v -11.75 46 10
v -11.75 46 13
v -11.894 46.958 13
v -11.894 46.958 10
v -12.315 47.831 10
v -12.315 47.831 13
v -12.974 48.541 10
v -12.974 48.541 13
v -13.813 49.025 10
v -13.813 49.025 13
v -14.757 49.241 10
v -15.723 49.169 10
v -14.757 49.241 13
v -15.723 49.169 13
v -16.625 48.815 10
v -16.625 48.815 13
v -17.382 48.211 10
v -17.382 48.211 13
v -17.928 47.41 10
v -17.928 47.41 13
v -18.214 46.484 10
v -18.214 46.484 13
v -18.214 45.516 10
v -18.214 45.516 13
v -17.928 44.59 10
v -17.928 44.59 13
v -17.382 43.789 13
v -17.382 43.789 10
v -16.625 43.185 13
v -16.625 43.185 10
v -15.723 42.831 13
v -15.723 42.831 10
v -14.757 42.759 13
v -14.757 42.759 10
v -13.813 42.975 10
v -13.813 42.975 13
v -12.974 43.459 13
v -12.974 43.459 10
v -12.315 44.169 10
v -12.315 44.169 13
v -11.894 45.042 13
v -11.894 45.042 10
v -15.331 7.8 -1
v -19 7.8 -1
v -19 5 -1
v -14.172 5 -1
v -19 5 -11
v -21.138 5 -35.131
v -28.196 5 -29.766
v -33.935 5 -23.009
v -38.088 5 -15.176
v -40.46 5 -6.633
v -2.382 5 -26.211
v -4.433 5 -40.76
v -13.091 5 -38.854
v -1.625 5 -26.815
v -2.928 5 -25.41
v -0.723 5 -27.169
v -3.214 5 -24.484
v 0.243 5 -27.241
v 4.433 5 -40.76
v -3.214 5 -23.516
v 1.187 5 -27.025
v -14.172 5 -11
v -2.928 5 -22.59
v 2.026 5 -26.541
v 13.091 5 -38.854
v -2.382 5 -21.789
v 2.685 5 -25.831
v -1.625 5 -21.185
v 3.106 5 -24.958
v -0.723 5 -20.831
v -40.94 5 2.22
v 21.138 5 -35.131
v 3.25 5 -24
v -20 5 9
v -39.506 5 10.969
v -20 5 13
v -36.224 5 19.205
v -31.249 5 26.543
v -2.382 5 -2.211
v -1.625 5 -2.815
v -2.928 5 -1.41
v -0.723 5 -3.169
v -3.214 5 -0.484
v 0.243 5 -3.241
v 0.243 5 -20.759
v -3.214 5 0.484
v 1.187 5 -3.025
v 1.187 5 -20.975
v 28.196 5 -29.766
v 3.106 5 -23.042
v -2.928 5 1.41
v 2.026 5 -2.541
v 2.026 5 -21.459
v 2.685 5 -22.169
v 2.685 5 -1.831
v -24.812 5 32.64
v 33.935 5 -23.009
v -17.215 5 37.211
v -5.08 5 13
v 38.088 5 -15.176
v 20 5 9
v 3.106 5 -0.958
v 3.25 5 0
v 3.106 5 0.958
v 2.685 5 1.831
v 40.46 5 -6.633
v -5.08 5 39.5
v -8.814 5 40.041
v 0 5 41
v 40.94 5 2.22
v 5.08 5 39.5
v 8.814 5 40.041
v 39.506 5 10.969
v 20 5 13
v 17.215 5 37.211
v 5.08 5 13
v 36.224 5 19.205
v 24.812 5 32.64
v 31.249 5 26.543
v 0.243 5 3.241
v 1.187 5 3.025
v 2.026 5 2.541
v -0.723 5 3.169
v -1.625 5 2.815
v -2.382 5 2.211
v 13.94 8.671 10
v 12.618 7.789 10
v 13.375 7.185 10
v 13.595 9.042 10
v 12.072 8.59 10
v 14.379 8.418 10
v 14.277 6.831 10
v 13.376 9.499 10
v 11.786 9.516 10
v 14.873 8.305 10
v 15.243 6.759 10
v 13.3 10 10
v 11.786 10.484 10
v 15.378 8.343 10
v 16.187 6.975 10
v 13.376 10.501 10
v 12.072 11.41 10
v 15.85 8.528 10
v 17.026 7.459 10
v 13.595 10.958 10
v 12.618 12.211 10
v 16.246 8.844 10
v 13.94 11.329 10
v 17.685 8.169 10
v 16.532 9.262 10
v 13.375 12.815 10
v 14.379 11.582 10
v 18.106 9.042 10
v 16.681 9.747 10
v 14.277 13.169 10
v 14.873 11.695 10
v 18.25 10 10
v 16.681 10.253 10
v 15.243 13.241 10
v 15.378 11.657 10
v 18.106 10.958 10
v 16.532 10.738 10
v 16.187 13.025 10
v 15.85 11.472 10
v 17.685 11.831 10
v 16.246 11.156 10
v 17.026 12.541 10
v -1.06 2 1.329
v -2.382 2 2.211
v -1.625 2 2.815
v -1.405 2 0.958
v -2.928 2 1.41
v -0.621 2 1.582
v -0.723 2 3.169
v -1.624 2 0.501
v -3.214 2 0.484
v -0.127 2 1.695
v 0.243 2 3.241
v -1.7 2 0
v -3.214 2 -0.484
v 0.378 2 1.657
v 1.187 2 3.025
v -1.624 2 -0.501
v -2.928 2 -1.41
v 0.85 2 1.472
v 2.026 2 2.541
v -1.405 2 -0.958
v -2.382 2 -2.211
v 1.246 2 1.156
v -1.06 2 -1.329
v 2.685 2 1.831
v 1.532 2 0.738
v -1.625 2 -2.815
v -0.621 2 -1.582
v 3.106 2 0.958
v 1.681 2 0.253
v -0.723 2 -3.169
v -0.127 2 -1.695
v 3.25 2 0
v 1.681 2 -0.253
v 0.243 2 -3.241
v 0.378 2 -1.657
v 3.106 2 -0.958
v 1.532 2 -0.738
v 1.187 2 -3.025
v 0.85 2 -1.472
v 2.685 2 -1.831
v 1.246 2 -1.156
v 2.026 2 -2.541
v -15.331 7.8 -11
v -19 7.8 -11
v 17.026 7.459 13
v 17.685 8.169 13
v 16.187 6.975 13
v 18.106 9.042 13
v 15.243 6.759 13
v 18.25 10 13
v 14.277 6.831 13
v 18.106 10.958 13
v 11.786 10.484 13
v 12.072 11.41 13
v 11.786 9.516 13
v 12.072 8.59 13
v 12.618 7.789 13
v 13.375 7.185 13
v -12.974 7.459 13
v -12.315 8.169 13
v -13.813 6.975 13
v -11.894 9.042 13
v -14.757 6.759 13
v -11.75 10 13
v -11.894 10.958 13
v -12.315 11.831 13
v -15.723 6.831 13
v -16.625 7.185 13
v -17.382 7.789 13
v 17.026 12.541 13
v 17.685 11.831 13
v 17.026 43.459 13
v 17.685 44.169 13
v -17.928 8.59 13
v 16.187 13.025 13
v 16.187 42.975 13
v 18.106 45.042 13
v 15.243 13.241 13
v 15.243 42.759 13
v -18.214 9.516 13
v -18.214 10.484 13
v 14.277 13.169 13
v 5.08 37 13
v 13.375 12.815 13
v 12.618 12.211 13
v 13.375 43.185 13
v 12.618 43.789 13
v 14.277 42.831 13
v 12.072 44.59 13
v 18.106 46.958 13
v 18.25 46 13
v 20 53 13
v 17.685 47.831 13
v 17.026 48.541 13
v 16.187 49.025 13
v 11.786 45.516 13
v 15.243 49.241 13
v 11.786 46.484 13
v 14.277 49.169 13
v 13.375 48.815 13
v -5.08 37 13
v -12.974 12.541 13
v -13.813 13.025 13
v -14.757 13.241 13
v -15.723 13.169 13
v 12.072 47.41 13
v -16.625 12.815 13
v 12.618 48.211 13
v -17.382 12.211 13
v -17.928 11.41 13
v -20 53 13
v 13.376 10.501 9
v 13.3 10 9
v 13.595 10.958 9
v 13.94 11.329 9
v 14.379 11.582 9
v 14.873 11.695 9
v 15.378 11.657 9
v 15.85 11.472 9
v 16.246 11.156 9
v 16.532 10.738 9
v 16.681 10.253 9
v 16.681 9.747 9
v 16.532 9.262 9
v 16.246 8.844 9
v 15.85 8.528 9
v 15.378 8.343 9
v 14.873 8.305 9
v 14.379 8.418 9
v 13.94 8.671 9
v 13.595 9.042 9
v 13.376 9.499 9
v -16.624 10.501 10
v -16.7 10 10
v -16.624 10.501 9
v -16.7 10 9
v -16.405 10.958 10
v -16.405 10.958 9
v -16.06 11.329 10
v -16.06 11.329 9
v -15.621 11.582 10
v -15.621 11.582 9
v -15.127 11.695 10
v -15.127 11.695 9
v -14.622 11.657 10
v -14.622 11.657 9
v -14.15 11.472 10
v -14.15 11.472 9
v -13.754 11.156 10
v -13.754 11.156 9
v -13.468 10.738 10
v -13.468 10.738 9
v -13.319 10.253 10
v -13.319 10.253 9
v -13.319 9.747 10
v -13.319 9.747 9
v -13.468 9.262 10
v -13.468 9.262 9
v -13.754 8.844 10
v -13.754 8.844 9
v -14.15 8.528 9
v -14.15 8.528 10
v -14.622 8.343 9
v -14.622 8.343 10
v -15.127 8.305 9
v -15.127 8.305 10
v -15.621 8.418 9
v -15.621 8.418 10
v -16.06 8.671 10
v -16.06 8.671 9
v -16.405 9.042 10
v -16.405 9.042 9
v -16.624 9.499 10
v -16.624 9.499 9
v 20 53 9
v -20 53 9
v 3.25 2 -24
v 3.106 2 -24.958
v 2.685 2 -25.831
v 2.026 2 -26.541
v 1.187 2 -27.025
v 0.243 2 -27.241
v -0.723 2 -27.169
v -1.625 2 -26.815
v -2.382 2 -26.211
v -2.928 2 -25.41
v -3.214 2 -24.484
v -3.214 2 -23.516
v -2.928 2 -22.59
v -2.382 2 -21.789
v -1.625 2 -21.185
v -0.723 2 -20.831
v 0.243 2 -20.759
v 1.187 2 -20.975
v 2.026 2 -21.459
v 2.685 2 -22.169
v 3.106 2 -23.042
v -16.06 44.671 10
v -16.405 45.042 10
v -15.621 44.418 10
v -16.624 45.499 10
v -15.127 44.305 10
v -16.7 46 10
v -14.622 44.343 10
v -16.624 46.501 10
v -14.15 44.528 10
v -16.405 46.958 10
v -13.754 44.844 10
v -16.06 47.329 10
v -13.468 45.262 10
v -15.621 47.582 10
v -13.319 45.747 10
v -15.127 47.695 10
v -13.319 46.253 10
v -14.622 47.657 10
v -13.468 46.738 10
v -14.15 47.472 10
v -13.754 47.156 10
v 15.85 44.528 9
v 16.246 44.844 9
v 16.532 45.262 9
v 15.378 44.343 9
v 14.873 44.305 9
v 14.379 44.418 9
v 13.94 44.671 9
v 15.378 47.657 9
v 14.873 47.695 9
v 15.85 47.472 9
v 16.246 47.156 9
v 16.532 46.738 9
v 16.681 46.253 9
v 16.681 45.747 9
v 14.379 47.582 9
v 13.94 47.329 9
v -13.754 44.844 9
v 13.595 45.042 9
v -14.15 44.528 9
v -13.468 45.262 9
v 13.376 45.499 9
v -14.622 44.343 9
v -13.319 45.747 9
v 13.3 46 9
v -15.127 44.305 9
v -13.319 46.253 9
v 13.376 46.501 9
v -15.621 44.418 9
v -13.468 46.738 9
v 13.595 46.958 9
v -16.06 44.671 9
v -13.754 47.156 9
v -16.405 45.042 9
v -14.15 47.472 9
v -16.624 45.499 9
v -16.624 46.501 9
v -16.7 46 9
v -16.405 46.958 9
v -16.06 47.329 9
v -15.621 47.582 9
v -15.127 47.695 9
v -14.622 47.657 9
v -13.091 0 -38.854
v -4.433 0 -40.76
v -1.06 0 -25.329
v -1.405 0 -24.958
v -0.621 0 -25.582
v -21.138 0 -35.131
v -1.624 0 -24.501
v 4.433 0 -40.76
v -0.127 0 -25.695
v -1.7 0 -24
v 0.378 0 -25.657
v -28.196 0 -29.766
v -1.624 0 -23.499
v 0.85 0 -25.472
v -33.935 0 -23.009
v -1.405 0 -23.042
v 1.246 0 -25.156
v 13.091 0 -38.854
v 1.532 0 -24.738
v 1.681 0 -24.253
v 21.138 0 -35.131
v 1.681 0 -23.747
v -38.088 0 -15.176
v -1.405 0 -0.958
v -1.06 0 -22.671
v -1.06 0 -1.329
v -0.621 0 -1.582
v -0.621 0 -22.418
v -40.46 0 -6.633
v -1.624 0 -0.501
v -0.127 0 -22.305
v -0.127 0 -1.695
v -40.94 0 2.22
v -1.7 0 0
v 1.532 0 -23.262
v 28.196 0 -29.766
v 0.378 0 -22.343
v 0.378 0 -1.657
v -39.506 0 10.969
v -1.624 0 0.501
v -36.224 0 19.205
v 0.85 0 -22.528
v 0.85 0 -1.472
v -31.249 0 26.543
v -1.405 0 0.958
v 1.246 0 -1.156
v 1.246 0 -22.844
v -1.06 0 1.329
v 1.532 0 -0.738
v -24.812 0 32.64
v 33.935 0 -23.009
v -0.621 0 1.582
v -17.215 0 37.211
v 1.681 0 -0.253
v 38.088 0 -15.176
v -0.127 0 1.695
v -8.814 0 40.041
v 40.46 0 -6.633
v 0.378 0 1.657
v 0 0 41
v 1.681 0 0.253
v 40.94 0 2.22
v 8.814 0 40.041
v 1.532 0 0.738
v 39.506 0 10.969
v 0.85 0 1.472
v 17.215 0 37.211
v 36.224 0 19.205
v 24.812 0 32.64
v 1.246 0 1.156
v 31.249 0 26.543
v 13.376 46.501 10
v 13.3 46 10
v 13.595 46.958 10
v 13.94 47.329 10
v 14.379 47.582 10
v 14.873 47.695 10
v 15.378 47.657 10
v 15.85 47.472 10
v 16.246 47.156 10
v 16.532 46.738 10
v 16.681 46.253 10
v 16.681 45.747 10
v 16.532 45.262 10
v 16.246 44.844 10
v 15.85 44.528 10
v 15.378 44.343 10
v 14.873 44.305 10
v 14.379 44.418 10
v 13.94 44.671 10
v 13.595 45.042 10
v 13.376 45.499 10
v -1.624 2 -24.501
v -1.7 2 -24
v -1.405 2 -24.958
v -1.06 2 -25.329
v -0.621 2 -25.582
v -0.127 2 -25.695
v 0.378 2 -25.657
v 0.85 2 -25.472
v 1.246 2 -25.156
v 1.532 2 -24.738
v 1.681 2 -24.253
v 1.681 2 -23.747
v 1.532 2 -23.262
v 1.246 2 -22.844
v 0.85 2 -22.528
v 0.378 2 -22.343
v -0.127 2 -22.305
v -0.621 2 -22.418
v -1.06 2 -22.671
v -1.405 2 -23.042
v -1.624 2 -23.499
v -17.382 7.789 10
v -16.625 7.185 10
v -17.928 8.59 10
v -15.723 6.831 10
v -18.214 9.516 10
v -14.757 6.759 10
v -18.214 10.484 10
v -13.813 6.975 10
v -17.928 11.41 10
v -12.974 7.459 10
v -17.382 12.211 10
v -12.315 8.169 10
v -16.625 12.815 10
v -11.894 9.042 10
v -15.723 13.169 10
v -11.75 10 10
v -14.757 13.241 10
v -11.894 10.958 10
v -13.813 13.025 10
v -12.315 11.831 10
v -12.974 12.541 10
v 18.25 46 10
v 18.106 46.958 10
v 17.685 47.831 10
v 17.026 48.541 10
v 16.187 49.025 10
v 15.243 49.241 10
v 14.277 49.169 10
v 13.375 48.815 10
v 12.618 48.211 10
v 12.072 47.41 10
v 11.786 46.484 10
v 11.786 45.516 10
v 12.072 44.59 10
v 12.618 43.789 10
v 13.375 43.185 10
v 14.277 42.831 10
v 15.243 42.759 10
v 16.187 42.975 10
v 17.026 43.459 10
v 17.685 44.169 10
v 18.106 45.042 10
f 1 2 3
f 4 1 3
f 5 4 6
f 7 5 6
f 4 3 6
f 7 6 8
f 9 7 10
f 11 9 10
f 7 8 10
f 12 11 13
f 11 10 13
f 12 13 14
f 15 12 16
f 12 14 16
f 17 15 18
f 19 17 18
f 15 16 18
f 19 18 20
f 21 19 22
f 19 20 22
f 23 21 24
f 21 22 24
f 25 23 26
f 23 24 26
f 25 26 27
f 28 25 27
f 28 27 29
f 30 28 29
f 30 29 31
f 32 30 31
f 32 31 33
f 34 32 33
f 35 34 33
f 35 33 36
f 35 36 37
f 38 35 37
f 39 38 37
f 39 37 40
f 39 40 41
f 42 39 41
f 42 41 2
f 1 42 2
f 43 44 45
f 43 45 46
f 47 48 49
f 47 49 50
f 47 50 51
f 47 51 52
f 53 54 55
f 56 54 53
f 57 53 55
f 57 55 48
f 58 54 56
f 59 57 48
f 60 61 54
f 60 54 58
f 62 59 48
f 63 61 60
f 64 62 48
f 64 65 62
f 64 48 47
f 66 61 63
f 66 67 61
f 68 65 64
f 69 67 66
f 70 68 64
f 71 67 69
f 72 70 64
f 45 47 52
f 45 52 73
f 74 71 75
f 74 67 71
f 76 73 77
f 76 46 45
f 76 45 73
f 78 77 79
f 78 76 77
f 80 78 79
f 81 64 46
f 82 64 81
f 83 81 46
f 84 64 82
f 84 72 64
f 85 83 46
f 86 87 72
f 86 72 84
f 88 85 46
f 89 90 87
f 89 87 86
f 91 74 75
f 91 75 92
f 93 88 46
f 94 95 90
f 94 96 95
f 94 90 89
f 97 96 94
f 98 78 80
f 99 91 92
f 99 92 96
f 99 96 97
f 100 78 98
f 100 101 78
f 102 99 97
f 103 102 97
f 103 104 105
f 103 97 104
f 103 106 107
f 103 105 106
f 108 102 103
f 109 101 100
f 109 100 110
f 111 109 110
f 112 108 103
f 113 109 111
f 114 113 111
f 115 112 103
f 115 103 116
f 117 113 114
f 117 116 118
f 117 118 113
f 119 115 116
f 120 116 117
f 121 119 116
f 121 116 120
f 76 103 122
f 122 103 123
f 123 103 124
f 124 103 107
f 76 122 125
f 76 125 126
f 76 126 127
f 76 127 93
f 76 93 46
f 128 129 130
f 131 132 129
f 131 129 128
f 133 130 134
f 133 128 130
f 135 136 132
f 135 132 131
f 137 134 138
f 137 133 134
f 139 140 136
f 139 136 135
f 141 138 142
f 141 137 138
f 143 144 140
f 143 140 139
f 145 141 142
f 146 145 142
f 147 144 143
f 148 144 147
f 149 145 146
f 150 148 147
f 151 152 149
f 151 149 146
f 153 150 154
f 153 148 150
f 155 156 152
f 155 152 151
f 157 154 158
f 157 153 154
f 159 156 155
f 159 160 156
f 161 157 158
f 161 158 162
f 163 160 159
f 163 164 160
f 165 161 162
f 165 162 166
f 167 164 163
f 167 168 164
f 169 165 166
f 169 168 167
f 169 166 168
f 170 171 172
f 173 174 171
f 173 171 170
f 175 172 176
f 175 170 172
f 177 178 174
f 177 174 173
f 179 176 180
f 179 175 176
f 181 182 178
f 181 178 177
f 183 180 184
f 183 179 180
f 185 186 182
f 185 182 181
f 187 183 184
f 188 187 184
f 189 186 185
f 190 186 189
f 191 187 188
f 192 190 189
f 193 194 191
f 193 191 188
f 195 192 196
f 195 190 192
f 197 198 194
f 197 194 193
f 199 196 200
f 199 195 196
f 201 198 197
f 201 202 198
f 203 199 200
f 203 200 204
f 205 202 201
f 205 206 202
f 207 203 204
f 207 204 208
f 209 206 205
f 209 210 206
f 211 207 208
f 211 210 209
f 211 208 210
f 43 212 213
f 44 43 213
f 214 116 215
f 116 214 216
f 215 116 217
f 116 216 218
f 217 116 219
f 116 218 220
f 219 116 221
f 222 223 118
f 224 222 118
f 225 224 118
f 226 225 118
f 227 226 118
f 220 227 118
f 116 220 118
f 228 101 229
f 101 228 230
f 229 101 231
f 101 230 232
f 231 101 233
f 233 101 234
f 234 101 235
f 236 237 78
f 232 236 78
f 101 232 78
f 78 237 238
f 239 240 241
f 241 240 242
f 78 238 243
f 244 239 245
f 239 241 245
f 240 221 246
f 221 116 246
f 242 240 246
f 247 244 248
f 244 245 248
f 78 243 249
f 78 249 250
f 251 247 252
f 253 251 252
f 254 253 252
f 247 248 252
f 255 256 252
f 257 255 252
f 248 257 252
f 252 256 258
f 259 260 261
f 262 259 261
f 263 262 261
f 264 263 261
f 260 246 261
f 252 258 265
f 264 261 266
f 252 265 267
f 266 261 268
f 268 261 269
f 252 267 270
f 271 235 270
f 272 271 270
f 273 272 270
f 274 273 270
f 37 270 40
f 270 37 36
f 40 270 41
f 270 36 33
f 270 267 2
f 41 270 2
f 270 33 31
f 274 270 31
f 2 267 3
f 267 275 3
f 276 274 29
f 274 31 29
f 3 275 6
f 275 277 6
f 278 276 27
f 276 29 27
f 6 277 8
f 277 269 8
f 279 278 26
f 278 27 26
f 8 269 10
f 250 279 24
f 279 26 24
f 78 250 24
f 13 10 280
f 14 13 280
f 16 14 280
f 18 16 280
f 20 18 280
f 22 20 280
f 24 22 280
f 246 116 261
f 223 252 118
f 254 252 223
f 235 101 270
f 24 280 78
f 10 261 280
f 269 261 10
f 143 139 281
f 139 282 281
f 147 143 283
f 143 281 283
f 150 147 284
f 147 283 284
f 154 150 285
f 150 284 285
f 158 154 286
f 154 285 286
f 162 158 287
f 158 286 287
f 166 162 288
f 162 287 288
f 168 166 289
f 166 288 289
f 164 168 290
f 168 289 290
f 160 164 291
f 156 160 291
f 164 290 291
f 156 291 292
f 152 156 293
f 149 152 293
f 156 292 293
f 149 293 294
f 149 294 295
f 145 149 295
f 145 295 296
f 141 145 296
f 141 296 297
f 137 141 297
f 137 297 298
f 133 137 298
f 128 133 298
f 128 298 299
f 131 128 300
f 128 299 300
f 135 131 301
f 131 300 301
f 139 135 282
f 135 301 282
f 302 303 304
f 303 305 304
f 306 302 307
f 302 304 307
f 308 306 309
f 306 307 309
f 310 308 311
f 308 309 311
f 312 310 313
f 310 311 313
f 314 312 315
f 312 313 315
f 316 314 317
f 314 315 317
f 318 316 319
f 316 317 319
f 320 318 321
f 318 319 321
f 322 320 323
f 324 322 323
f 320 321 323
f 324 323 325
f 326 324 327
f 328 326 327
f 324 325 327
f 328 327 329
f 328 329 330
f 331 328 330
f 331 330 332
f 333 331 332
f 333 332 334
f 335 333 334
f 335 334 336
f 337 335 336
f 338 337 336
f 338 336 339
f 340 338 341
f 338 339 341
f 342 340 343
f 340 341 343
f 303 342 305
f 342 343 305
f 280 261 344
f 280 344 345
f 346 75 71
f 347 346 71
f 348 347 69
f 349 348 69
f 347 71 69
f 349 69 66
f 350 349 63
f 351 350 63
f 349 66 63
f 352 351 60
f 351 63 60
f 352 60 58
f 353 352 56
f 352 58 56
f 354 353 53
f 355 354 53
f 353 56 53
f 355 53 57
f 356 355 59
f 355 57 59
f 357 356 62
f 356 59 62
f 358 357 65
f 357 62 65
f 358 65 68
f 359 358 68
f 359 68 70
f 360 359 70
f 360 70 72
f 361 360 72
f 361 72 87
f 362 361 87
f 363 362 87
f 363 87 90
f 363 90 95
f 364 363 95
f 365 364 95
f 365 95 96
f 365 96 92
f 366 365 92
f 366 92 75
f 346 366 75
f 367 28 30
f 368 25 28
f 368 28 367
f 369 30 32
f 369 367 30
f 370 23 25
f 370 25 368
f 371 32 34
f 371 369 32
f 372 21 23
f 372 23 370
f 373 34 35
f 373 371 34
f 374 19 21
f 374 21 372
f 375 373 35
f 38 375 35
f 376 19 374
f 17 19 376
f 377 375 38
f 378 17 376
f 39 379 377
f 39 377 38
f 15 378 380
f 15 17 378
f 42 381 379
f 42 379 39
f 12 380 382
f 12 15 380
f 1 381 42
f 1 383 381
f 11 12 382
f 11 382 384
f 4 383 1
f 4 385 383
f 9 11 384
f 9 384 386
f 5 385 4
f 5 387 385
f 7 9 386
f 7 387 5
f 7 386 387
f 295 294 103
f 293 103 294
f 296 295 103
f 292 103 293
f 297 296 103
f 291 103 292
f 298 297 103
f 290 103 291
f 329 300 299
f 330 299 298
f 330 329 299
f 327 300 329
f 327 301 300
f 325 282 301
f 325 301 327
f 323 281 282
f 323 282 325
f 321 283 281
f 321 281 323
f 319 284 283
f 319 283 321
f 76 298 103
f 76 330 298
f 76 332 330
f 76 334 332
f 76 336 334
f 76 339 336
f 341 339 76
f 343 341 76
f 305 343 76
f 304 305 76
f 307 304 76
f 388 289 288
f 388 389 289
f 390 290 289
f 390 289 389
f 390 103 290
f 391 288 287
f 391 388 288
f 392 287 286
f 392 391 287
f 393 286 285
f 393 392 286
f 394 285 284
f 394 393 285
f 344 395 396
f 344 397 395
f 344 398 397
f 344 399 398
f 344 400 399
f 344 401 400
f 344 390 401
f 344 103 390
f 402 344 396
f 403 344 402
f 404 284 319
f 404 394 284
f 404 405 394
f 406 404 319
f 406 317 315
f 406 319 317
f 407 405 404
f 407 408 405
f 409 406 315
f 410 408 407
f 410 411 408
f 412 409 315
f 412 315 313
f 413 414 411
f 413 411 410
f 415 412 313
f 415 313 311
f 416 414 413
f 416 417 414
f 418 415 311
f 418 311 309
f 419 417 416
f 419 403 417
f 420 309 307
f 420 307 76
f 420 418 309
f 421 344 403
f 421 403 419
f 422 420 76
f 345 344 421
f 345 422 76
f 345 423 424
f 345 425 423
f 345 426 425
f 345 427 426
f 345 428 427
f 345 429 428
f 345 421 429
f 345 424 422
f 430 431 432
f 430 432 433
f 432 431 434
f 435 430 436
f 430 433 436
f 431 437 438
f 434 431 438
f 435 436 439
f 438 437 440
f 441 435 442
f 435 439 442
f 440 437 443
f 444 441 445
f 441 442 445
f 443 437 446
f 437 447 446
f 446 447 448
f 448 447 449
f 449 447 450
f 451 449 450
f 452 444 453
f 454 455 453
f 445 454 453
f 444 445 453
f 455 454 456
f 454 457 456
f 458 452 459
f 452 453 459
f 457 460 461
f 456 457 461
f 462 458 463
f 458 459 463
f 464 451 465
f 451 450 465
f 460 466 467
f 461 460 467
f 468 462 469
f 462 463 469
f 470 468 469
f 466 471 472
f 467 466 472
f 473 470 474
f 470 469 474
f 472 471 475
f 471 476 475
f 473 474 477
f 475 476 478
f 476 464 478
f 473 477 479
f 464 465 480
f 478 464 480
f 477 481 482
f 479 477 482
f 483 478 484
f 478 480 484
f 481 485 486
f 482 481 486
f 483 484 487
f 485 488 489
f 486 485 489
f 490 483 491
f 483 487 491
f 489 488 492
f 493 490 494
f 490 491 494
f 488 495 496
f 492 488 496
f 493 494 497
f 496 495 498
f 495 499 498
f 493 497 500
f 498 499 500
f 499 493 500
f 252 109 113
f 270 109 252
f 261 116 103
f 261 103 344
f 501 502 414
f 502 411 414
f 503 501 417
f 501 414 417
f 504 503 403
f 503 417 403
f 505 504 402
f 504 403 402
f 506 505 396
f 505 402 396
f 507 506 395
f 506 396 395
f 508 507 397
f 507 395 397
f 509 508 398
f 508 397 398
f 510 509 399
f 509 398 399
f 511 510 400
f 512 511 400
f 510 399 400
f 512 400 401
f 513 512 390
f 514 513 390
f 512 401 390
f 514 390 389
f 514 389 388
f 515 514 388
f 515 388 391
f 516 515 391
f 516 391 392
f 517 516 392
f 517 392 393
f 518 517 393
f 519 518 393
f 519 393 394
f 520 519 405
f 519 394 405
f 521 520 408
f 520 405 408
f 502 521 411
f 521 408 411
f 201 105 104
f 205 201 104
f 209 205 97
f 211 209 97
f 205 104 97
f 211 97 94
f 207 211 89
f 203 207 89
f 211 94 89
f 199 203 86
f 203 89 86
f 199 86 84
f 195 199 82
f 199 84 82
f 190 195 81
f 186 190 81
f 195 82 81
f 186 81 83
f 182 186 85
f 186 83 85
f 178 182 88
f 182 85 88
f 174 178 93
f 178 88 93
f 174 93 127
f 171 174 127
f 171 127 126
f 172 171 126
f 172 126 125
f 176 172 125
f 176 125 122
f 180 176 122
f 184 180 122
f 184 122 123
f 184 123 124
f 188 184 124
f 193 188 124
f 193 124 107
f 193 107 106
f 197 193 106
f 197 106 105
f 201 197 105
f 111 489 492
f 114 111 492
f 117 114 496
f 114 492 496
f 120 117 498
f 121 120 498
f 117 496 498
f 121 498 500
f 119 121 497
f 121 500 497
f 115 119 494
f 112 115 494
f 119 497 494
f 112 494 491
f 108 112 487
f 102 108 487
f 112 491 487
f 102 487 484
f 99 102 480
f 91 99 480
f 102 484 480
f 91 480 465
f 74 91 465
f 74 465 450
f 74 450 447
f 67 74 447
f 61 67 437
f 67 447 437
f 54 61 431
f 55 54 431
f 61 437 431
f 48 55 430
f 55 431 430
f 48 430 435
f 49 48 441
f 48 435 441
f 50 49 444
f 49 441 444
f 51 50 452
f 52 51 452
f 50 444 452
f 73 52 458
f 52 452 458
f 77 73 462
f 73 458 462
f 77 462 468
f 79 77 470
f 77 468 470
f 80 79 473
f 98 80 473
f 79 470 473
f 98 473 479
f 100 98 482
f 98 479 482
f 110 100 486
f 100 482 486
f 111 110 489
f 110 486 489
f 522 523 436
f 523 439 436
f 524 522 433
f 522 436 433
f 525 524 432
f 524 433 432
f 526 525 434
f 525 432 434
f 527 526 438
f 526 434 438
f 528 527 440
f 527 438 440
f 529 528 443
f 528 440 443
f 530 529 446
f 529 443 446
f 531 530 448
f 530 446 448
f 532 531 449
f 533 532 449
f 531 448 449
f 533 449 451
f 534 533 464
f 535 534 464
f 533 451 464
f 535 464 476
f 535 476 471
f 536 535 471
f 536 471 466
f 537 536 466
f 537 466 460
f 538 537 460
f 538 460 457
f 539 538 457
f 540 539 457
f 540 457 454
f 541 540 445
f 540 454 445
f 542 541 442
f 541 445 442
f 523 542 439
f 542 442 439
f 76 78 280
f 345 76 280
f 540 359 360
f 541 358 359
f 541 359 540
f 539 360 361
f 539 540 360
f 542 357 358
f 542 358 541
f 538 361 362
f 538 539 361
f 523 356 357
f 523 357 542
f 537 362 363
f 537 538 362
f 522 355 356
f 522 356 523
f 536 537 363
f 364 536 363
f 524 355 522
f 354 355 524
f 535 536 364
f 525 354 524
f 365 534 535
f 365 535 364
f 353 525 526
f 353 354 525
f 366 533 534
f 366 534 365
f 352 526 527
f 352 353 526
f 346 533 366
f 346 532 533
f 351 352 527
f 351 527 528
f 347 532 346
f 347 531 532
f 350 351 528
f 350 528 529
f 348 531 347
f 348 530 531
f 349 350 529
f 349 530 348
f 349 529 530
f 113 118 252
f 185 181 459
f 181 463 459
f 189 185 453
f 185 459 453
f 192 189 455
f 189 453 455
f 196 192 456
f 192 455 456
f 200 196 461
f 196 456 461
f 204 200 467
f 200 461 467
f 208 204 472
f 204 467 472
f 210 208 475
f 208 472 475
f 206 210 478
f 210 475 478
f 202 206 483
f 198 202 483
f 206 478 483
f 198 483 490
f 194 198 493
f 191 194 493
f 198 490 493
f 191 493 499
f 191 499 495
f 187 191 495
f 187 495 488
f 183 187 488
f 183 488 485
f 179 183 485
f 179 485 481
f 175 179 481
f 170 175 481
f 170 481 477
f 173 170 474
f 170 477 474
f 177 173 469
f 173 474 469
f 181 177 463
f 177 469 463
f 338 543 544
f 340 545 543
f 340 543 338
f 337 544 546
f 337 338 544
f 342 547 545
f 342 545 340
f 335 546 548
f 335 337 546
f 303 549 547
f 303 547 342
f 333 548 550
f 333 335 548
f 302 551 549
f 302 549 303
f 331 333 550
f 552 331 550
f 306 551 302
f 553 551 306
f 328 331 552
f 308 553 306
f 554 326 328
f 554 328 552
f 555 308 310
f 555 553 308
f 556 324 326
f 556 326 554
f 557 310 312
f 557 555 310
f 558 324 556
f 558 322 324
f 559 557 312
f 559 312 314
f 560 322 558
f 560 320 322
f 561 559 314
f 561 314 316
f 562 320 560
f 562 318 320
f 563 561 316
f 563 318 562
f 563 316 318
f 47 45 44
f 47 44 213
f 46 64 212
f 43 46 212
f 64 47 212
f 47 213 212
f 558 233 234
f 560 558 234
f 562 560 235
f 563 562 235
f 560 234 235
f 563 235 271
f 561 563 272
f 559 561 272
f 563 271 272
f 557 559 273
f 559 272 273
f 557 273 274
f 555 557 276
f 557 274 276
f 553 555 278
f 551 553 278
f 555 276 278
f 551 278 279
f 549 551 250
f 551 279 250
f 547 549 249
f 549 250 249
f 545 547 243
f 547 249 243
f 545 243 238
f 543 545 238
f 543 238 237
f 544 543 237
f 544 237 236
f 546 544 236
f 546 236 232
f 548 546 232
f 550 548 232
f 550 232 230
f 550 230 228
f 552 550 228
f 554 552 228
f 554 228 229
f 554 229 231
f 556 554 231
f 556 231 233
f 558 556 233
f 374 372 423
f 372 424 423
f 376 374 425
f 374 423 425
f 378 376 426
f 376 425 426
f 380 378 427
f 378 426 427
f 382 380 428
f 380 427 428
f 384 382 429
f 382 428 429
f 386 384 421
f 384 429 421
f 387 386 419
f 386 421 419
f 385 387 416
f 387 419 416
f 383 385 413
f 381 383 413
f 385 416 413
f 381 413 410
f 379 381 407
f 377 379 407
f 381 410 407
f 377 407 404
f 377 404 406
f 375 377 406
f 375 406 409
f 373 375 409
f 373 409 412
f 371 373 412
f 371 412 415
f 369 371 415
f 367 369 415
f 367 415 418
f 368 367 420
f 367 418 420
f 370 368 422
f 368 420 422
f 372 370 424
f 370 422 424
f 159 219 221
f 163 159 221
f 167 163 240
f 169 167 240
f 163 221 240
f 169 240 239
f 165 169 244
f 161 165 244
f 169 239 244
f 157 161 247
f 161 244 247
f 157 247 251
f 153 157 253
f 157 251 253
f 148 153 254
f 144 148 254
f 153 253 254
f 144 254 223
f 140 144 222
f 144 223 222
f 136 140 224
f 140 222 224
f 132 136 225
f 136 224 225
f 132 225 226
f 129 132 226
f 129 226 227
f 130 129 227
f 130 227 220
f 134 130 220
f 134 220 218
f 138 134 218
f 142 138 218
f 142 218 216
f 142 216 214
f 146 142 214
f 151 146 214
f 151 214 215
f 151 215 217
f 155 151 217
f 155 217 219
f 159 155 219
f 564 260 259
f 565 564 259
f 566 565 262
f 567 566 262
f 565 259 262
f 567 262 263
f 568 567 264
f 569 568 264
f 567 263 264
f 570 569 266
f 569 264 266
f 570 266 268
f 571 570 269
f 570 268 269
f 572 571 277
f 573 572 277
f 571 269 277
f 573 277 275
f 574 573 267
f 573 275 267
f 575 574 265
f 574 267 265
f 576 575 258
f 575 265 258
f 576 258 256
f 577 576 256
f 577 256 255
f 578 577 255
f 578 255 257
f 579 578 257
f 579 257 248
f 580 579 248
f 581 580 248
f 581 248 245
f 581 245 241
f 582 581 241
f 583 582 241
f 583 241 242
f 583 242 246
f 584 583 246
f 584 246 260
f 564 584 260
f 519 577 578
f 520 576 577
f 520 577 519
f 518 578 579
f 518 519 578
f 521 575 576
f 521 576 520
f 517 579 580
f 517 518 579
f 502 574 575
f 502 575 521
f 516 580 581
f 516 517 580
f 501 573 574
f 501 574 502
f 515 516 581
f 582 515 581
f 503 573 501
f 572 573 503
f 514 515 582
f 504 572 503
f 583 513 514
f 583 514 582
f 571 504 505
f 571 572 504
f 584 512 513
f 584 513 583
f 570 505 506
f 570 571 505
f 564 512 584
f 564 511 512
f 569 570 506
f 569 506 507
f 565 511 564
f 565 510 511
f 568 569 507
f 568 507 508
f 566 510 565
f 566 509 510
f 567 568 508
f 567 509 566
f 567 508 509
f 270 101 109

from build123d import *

# Parameters (mm, degrees)
SKETCH1_R                                    = 41
BOSS_EXTRUDE1_DEPTH                          = 5
BOSS_EXTRUDE2_DEPTH                          = 5.08
BOSS_EXTRUDE2_DEPTH_BACK                     = 5.08
SKETCH7_W                                    = 40
SKETCH7_H                                    = 48
BOSS_EXTRUDE3_DEPTH                          = 4
CBORE_FOR_M5_HEX_HEAD_CAP_SCREW5_D           = 3.4
CBORE_FOR_M5_HEX_HEAD_CAP_SCREW5_DEPTH       = 5.5
CBORE_FOR_M5_HEX_HEAD_CAP_SCREW5_CBORE_D     = 6.5
CBORE_FOR_M5_HEX_HEAD_CAP_SCREW5_CBORE_DEPTH = 3
CBORE_FOR_M5_HEX_HEAD_CAP_SCREW5_TIP         = 1.021463052
SKETCH22_W                                   = 4
SKETCH22_H                                   = 10
BOSS_EXTRUDE4_DEPTH                          = 2
BOSS_EXTRUDE5_DEPTH                          = 10
CBORE_FOR_M5_HEX_HEAD_CAP_SCREW6_D           = 3.4
CBORE_FOR_M5_HEX_HEAD_CAP_SCREW6_DEPTH       = 5.5
CBORE_FOR_M5_HEX_HEAD_CAP_SCREW6_CBORE_D     = 6.5
CBORE_FOR_M5_HEX_HEAD_CAP_SCREW6_CBORE_DEPTH = 3
CBORE_FOR_M5_HEX_HEAD_CAP_SCREW6_TIP         = 1.021463052


with BuildPart() as part:
    # Sketch1 → Boss-Extrude1 (new body)
    with BuildSketch(Plane(origin=(0, 0, 0), x_dir=(1, 0, 0), z_dir=(0, 1, 0))):
        with Locations(Location((0, 0, 0), (0, 0, 270))):
            Circle(SKETCH1_R)
    extrude(amount=BOSS_EXTRUDE1_DEPTH)

    # Sketch6 → Boss-Extrude2 (add, two sides: drawn at the far end of the back side and taken through both)
    with BuildSketch(Plane(origin=(0, 0, 0), x_dir=(0, 0, -1), z_dir=(1, 0, 0)).offset(-BOSS_EXTRUDE2_DEPTH_BACK)):
        Polygon((-13, 5), (-39.5, 5), (-13, 37), align=None)
    extrude(amount=BOSS_EXTRUDE2_DEPTH + BOSS_EXTRUDE2_DEPTH_BACK)

    # Sketch7 → Boss-Extrude3 (add)
    with BuildSketch(Plane(origin=(0, 0, 13), x_dir=(-1, 0, 0), z_dir=(0, 0, -1))):
        with Locations((0, 29)):
            Rectangle(SKETCH7_W, SKETCH7_H)
    extrude(amount=BOSS_EXTRUDE3_DEPTH)

    # CBORE for M5 Hex Head Cap Screw5
    with Locations(Plane(origin=(0, 5, 0), x_dir=(1, 0, 0), z_dir=(0, 1, 0))):
        with Locations((0, 0), (0, 24)):
            CounterBoreHole(CBORE_FOR_M5_HEX_HEAD_CAP_SCREW5_D / 2, CBORE_FOR_M5_HEX_HEAD_CAP_SCREW5_CBORE_D / 2, CBORE_FOR_M5_HEX_HEAD_CAP_SCREW5_CBORE_DEPTH, depth=CBORE_FOR_M5_HEX_HEAD_CAP_SCREW5_DEPTH)
            with Locations((0, 0, -(CBORE_FOR_M5_HEX_HEAD_CAP_SCREW5_DEPTH + CBORE_FOR_M5_HEX_HEAD_CAP_SCREW5_TIP / 2))):  # 118° drill point
                Cone(0, CBORE_FOR_M5_HEX_HEAD_CAP_SCREW5_D / 2, CBORE_FOR_M5_HEX_HEAD_CAP_SCREW5_TIP, mode=Mode.SUBTRACT)

    # Sketch22 → Boss-Extrude4 (add)
    with BuildSketch(Plane(origin=(0, 5, 0), x_dir=(1, 0, 0), z_dir=(0, 1, 0))):
        with Locations((-17, 6)):
            Rectangle(SKETCH22_W, SKETCH22_H)
    extrude(amount=BOSS_EXTRUDE4_DEPTH)

    # Sketch23 → Boss-Extrude5 (add)
    with BuildSketch(Plane(origin=(0, 0, -11), x_dir=(-1, 0, 0), z_dir=(0, 0, -1))):
        Polygon((14.171572875, 5), (15.33137085, 7.8), (19, 7.8), (19, 5), align=None)
    extrude(amount=-BOSS_EXTRUDE5_DEPTH)

    # CBORE for M5 Hex Head Cap Screw6
    with Locations(Plane.XY.offset(13)):
        with Locations((15, 10), (-15, 10), (-15, 46), (15, 46)):
            CounterBoreHole(CBORE_FOR_M5_HEX_HEAD_CAP_SCREW6_D / 2, CBORE_FOR_M5_HEX_HEAD_CAP_SCREW6_CBORE_D / 2, CBORE_FOR_M5_HEX_HEAD_CAP_SCREW6_CBORE_DEPTH, depth=CBORE_FOR_M5_HEX_HEAD_CAP_SCREW6_DEPTH)
            with Locations((0, 0, -(CBORE_FOR_M5_HEX_HEAD_CAP_SCREW6_DEPTH + CBORE_FOR_M5_HEX_HEAD_CAP_SCREW6_TIP / 2))):  # 118° drill point
                Cone(0, CBORE_FOR_M5_HEX_HEAD_CAP_SCREW6_D / 2, CBORE_FOR_M5_HEX_HEAD_CAP_SCREW6_TIP, mode=Mode.SUBTRACT)


solid = part.part
